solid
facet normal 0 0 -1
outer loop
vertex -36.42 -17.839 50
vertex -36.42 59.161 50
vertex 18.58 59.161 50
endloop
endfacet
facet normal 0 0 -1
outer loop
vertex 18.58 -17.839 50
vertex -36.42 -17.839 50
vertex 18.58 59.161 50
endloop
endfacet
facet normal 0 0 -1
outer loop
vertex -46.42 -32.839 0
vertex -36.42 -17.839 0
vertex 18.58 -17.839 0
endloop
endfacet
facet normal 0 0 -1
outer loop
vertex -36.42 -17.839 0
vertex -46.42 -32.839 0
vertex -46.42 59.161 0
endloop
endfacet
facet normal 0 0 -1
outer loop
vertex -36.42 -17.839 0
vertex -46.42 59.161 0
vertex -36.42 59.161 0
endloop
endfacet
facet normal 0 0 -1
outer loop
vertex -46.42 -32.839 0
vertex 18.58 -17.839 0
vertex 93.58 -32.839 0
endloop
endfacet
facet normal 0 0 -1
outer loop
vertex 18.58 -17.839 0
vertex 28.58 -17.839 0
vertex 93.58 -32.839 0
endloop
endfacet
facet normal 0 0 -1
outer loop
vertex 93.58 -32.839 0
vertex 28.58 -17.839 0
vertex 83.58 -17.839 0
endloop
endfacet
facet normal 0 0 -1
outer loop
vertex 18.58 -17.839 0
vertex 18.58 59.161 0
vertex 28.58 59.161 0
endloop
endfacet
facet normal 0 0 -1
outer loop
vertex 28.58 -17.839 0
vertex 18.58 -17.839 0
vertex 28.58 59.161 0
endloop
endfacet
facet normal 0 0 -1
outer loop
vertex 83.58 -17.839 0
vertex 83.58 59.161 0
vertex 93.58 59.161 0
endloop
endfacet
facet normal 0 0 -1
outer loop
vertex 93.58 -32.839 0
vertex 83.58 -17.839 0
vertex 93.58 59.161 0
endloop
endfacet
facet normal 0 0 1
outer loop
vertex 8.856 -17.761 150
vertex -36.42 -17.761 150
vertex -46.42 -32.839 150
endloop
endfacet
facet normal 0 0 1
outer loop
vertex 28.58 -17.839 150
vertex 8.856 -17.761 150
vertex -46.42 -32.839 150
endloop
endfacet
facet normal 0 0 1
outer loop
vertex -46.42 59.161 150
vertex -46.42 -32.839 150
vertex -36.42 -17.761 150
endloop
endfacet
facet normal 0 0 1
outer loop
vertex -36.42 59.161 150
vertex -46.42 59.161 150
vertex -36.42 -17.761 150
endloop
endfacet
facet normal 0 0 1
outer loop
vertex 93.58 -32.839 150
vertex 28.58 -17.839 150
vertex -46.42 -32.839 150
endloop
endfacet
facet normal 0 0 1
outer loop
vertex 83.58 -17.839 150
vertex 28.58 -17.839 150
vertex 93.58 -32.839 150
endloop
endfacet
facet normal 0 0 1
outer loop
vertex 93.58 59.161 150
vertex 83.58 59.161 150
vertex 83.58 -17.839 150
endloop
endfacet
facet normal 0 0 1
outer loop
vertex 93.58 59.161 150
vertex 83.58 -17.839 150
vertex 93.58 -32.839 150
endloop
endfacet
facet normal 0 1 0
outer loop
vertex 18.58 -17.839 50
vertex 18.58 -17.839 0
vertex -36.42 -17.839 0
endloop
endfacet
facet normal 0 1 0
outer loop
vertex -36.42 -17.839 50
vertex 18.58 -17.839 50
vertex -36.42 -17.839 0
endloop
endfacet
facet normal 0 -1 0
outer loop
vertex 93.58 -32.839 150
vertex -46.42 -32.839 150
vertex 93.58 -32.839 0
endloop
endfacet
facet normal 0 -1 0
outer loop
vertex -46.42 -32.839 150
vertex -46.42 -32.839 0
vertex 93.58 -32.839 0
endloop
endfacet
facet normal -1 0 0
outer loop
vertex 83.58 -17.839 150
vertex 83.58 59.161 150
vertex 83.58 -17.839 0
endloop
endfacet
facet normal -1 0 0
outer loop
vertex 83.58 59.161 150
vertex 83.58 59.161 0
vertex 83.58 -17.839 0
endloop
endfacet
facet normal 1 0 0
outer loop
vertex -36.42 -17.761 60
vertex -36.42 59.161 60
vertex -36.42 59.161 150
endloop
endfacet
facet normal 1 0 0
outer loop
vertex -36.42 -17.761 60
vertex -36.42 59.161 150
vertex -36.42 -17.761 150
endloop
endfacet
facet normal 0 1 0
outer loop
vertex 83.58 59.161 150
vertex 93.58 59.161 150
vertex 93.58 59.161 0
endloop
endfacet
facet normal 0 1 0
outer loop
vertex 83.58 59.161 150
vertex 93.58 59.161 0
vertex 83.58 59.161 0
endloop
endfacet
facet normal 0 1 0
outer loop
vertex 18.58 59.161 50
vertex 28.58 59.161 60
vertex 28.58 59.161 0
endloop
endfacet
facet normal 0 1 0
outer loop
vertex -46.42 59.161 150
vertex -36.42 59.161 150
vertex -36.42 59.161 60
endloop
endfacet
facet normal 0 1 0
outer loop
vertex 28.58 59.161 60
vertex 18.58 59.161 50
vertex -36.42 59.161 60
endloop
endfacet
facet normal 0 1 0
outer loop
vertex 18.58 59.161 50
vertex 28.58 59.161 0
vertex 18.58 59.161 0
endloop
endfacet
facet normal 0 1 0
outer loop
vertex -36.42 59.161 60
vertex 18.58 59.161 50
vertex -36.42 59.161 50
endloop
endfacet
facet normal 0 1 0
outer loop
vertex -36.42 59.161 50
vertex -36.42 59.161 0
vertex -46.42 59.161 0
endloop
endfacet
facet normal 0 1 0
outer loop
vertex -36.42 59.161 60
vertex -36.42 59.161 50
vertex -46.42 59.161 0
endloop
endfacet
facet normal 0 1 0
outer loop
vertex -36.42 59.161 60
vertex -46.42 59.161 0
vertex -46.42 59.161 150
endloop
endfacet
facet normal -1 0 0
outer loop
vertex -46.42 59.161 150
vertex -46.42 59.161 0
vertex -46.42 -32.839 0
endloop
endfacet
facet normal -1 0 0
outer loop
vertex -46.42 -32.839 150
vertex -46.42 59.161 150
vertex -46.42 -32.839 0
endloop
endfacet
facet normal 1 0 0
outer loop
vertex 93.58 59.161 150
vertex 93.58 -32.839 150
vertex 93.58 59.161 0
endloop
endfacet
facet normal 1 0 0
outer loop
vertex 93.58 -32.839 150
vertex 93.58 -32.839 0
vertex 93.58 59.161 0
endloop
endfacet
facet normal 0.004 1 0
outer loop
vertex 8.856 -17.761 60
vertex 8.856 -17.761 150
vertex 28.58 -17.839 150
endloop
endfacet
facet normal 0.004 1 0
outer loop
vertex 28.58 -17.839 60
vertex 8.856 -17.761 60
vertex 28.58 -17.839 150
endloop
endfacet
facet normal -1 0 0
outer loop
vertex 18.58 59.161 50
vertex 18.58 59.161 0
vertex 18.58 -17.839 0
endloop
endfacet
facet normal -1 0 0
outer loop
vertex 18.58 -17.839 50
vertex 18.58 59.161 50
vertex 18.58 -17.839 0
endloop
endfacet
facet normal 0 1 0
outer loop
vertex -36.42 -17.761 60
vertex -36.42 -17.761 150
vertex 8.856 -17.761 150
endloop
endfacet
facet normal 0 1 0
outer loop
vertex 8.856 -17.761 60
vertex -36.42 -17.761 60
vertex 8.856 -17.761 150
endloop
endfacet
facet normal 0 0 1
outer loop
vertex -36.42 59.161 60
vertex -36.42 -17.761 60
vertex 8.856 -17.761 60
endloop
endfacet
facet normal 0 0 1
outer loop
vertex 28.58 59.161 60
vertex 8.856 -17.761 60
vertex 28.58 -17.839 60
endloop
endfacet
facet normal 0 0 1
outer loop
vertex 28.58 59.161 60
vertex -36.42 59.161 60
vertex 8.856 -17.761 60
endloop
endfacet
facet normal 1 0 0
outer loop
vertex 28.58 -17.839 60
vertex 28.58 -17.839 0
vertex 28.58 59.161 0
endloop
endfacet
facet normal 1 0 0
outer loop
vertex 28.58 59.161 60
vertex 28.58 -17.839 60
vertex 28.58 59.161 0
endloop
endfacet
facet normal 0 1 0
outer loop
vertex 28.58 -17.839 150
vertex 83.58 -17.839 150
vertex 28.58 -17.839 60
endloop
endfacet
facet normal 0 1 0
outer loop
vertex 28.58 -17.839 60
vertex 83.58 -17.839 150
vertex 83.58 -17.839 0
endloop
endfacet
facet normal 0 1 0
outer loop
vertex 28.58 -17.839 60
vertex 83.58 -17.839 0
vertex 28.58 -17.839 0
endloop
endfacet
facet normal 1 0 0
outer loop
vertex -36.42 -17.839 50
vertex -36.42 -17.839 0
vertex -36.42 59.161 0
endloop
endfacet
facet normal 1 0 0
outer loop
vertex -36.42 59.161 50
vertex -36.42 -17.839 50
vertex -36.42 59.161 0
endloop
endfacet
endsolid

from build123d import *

# Parameters (mm, degrees)
F1_DEPTH = 50
F2_W     = 55
F2_H     = 77
F3_DEPTH = 100
F5_DEPTH = 90


with BuildPart() as f1:
    # F0 (on Top) → F1 (new body)
    with BuildSketch(Plane.XY):
        Polygon((-36.420125, 59.16098), (-46.420125, 59.16098), (-46.420125, -32.83902), (93.579875, -32.83902), (93.579875, 59.16098), (83.579875, 59.16098), (83.579875, -17.83902), (28.579875, -17.83902), (28.579875, 59.16098), (18.579875, 59.16098), (18.579875, -17.83902), (-36.420125, -17.83902), align=None)
    extrude(amount=F1_DEPTH)

    # F2 (on face) → F3 (join)
    with BuildSketch(Plane.XY.offset(50)):
        with Locations((-8.920125, 20.66098)):
            Rectangle(F2_W, F2_H)
        Polygon((-36.420125, -17.83902), (-36.420125, 59.16098), (-46.420125, 59.16098), (-46.420125, -32.83902), (93.579875, -32.83902), (93.579875, 59.16098), (83.579875, 59.16098), (83.579875, -17.83902), (28.579875, -17.83902), (28.579875, 59.16098), (18.579875, 59.16098), (18.579875, -17.83902), align=None)
    extrude(amount=F3_DEPTH)

    # F4 (on face) → F5 (cut)
    with BuildSketch(Plane.XY.offset(150)):
        Polygon((28.579875, 59.16098), (-36.420125, 59.16098), (-36.420125, -17.760558), (8.856312, -17.760558), (28.579875, -17.83902), align=None)
    extrude(amount=-F5_DEPTH, mode=Mode.SUBTRACT)


solid = f1.part
